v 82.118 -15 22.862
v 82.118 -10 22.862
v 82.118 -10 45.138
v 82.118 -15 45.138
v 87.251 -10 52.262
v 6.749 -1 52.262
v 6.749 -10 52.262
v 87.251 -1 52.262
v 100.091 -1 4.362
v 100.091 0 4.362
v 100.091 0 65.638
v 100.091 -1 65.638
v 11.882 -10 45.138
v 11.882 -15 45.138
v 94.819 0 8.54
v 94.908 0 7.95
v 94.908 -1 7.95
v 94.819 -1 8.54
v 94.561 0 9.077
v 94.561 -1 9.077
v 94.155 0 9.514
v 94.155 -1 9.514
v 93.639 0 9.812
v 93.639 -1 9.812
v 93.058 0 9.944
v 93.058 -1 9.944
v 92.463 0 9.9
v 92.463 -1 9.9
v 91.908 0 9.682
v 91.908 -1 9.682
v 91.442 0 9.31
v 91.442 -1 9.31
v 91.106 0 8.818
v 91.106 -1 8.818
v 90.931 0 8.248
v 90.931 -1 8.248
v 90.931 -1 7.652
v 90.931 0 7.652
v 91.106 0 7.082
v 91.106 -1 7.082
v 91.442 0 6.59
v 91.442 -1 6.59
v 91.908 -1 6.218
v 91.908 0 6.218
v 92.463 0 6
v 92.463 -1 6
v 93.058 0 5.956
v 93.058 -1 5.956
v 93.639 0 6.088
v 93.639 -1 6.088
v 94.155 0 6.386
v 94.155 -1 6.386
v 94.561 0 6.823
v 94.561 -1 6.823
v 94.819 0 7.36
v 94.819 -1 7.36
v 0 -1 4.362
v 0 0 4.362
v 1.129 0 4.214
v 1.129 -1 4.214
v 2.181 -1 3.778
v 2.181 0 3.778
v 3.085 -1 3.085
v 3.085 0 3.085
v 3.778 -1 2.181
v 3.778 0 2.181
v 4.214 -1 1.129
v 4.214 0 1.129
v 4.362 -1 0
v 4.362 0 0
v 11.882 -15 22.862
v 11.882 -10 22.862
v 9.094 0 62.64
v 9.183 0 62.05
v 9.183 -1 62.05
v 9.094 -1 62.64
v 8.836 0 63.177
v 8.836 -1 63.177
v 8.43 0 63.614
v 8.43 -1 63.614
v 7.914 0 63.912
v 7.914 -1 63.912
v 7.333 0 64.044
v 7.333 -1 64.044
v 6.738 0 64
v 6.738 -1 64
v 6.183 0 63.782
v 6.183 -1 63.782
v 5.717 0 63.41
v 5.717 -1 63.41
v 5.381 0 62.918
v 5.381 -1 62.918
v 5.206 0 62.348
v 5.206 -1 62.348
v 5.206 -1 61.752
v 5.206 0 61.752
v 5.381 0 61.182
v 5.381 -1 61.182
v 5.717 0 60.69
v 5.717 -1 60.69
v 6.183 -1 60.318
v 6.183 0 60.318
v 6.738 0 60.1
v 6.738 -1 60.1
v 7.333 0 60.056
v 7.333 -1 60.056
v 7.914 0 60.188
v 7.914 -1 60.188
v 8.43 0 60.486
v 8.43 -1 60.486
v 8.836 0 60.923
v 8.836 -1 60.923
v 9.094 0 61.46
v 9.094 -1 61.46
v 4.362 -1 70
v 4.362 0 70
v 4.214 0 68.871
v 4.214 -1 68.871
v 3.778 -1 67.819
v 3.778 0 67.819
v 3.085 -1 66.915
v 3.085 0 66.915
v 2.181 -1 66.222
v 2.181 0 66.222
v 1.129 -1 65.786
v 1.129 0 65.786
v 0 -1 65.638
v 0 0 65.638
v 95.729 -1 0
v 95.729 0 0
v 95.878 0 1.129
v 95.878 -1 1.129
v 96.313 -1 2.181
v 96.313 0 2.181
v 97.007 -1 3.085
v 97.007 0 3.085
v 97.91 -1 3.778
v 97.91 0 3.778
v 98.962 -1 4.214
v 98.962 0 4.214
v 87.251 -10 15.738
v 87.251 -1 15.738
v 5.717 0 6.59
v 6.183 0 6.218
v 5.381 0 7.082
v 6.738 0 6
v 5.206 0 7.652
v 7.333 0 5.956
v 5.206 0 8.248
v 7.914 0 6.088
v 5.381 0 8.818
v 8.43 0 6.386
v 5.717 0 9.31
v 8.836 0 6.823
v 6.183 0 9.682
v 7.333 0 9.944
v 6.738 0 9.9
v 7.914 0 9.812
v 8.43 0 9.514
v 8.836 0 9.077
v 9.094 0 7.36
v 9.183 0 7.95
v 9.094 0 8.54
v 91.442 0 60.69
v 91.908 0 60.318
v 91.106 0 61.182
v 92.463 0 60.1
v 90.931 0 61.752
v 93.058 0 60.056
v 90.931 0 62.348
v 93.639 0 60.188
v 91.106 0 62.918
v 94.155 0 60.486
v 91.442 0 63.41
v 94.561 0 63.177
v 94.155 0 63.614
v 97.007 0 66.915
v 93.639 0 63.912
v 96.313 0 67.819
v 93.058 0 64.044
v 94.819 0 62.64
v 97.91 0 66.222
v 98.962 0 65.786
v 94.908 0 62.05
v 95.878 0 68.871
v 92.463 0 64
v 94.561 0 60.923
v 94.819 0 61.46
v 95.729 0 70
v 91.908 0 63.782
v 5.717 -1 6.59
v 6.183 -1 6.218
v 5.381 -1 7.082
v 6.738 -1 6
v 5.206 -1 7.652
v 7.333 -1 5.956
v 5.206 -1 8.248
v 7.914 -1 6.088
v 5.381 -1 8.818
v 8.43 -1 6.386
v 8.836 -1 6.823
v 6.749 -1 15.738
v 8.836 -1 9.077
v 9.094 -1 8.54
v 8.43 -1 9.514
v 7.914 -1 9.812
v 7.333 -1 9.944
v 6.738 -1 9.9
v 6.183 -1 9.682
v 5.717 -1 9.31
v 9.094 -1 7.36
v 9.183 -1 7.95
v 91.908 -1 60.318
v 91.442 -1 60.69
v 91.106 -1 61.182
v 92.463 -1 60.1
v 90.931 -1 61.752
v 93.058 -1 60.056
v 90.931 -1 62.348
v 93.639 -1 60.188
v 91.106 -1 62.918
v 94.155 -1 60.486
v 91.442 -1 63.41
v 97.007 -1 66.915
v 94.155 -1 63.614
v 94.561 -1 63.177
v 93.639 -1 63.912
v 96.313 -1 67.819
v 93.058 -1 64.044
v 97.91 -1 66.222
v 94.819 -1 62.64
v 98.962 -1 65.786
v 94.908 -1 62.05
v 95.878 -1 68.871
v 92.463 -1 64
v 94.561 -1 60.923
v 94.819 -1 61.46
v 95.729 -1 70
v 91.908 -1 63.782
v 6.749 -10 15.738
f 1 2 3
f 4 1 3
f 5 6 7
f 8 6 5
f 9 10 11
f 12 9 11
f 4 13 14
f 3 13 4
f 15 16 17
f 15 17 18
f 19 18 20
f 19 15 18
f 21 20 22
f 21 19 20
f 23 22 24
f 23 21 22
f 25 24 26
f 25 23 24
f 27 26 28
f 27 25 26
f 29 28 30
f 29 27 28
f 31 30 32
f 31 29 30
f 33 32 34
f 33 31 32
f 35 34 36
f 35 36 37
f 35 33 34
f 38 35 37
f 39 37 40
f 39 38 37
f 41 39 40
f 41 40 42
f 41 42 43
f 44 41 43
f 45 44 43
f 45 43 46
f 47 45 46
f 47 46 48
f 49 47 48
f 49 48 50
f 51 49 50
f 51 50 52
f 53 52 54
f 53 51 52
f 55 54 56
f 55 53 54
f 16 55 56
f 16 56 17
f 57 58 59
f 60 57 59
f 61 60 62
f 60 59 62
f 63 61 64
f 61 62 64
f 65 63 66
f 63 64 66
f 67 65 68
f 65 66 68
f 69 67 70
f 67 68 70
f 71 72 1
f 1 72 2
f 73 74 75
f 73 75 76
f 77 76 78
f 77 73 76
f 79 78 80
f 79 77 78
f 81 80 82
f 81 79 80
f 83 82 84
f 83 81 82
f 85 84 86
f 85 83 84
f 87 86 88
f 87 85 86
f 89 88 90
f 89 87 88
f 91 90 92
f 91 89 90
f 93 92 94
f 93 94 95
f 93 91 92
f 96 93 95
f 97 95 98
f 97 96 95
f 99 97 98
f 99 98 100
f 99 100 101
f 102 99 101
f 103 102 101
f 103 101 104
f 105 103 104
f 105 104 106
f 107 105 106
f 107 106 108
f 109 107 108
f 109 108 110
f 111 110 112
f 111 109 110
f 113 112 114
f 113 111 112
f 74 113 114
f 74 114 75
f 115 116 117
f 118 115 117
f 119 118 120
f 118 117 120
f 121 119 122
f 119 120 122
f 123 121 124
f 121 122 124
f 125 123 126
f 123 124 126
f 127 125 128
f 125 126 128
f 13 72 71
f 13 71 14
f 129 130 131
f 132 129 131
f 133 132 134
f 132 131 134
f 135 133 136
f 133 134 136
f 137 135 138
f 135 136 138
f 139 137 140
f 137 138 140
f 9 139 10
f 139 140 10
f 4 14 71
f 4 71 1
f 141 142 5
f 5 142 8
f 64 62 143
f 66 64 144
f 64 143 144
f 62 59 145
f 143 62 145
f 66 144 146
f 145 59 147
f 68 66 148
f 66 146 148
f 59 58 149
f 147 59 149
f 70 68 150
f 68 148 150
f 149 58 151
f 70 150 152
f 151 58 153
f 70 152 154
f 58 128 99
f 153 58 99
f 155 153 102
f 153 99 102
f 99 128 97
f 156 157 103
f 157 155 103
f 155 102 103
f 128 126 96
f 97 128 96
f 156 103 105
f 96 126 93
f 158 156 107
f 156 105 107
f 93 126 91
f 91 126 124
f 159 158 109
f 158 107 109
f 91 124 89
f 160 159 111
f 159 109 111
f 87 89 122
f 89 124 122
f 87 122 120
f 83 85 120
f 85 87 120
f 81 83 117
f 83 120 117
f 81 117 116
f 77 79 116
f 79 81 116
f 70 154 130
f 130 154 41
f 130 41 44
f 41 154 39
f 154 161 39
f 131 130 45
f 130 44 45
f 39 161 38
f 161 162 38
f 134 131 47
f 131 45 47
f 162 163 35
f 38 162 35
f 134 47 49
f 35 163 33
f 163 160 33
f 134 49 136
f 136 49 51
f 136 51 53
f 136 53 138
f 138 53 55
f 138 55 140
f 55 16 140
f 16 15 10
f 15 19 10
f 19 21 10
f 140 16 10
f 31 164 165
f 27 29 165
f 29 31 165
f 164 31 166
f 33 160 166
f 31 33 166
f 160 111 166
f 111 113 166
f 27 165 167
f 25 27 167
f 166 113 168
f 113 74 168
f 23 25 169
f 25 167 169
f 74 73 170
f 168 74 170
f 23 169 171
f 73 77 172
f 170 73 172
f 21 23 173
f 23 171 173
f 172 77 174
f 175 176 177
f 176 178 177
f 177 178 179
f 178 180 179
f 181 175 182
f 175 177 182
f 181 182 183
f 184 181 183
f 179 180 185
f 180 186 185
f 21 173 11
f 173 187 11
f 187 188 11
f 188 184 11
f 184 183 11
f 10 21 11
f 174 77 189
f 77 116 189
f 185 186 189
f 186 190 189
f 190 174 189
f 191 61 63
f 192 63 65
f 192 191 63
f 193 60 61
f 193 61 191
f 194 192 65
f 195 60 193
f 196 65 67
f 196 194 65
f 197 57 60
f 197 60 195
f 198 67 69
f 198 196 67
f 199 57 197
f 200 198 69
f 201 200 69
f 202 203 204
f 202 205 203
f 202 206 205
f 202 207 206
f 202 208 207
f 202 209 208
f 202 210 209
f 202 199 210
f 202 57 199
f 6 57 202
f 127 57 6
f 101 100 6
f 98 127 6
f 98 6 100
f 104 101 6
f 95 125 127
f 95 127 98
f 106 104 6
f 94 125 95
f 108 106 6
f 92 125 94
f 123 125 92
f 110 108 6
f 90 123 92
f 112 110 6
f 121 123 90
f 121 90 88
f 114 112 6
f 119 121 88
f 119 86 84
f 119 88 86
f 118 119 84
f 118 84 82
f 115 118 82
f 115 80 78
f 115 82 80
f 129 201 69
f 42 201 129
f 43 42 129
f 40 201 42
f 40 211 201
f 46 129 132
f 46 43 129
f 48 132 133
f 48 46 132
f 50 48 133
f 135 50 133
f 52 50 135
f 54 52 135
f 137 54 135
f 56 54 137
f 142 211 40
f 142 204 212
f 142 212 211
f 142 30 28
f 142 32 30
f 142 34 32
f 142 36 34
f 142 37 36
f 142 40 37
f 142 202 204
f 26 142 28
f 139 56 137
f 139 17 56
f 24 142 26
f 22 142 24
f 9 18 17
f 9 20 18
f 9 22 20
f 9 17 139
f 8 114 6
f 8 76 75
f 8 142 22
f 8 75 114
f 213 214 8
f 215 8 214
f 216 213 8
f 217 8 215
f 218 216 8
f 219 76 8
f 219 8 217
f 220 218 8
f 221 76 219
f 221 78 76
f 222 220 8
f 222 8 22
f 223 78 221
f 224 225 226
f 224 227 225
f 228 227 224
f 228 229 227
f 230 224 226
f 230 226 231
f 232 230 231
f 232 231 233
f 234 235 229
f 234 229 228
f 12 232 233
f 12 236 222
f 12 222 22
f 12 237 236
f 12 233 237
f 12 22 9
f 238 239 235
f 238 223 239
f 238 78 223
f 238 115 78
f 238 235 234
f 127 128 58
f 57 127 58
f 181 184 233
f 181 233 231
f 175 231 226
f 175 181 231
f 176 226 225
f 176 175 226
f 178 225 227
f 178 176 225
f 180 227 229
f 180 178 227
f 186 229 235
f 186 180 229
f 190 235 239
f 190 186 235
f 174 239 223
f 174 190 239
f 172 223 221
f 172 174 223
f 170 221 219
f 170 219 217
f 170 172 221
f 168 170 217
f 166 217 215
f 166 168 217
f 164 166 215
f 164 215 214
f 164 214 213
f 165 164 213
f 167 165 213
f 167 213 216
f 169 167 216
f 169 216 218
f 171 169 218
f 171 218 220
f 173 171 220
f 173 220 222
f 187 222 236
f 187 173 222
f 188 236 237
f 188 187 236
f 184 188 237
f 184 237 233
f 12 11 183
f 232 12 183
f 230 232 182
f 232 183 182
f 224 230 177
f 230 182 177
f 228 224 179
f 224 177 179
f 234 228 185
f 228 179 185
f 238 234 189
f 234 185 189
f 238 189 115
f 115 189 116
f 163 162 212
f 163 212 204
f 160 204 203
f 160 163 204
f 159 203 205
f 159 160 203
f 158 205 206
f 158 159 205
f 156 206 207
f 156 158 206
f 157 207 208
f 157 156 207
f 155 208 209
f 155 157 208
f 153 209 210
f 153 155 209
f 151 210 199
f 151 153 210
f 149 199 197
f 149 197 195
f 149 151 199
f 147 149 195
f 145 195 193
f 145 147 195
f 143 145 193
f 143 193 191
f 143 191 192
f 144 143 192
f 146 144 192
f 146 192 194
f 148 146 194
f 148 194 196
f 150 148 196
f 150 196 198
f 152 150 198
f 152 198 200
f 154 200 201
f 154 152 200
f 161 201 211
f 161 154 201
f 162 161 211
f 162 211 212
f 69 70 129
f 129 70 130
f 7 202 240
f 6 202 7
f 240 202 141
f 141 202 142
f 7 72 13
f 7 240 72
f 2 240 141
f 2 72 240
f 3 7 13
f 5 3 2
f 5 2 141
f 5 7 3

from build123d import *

# Parameters (mm, degrees)
F0_R     = 2
F0_W     = 80.502108
F0_H     = 36.524102
F1_DEPTH = 1
F0_W_2   = 70.236466
F0_H_2   = 22.275392
F2_DEPTH = 10
F3_DEPTH = 15


with BuildPart() as f1:
    # F0 (on Front) → F1 (new body)
    with BuildSketch(Plane.XZ):
        with BuildLine():
            ThreePointArc((4.3625, 70), (3.084753, 66.915247), (0, 65.6375))
            Line((0, 65.6375), (0, 4.3625))
            ThreePointArc((0, 4.3625), (3.084753, 3.084753), (4.3625, 0))
            Line((4.3625, 0), (95.728963, 0))
            ThreePointArc((95.728963, 0), (97.00671, 3.084753), (100.091463, 4.3625))
            Line((100.091463, 4.3625), (100.091463, 65.6375))
            ThreePointArc((100.091463, 65.6375), (97.00671, 66.915247), (95.728963, 70))
            Line((95.728963, 70), (4.3625, 70))
        make_face()
        with Locations((7.183232, 7.95)):
            Circle(F0_R, mode=Mode.SUBTRACT)
        with Locations((47, 34)):
            Rectangle(F0_W, F0_H, mode=Mode.SUBTRACT)
        with Locations((92.908232, 7.95)):
            Circle(F0_R, mode=Mode.SUBTRACT)
        with Locations((7.183232, 62.05)):
            Circle(F0_R, mode=Mode.SUBTRACT)
        with Locations((92.908232, 62.05)):
            Circle(F0_R, mode=Mode.SUBTRACT)
    extrude(amount=F1_DEPTH)

    # F0 (on Front) → F2 (join)
    with BuildSketch(Plane.XZ):
        with Locations((47, 34)):
            Rectangle(F0_W, F0_H)
        with Locations((47, 34)):
            Rectangle(F0_W_2, F0_H_2, mode=Mode.SUBTRACT)
    extrude(amount=F2_DEPTH)

    # F0 (on Front) → F3 (join)
    with BuildSketch(Plane.XZ):
        with Locations((47, 34)):
            Rectangle(F0_W_2, F0_H_2)
    extrude(amount=F3_DEPTH)


solid = f1.part
